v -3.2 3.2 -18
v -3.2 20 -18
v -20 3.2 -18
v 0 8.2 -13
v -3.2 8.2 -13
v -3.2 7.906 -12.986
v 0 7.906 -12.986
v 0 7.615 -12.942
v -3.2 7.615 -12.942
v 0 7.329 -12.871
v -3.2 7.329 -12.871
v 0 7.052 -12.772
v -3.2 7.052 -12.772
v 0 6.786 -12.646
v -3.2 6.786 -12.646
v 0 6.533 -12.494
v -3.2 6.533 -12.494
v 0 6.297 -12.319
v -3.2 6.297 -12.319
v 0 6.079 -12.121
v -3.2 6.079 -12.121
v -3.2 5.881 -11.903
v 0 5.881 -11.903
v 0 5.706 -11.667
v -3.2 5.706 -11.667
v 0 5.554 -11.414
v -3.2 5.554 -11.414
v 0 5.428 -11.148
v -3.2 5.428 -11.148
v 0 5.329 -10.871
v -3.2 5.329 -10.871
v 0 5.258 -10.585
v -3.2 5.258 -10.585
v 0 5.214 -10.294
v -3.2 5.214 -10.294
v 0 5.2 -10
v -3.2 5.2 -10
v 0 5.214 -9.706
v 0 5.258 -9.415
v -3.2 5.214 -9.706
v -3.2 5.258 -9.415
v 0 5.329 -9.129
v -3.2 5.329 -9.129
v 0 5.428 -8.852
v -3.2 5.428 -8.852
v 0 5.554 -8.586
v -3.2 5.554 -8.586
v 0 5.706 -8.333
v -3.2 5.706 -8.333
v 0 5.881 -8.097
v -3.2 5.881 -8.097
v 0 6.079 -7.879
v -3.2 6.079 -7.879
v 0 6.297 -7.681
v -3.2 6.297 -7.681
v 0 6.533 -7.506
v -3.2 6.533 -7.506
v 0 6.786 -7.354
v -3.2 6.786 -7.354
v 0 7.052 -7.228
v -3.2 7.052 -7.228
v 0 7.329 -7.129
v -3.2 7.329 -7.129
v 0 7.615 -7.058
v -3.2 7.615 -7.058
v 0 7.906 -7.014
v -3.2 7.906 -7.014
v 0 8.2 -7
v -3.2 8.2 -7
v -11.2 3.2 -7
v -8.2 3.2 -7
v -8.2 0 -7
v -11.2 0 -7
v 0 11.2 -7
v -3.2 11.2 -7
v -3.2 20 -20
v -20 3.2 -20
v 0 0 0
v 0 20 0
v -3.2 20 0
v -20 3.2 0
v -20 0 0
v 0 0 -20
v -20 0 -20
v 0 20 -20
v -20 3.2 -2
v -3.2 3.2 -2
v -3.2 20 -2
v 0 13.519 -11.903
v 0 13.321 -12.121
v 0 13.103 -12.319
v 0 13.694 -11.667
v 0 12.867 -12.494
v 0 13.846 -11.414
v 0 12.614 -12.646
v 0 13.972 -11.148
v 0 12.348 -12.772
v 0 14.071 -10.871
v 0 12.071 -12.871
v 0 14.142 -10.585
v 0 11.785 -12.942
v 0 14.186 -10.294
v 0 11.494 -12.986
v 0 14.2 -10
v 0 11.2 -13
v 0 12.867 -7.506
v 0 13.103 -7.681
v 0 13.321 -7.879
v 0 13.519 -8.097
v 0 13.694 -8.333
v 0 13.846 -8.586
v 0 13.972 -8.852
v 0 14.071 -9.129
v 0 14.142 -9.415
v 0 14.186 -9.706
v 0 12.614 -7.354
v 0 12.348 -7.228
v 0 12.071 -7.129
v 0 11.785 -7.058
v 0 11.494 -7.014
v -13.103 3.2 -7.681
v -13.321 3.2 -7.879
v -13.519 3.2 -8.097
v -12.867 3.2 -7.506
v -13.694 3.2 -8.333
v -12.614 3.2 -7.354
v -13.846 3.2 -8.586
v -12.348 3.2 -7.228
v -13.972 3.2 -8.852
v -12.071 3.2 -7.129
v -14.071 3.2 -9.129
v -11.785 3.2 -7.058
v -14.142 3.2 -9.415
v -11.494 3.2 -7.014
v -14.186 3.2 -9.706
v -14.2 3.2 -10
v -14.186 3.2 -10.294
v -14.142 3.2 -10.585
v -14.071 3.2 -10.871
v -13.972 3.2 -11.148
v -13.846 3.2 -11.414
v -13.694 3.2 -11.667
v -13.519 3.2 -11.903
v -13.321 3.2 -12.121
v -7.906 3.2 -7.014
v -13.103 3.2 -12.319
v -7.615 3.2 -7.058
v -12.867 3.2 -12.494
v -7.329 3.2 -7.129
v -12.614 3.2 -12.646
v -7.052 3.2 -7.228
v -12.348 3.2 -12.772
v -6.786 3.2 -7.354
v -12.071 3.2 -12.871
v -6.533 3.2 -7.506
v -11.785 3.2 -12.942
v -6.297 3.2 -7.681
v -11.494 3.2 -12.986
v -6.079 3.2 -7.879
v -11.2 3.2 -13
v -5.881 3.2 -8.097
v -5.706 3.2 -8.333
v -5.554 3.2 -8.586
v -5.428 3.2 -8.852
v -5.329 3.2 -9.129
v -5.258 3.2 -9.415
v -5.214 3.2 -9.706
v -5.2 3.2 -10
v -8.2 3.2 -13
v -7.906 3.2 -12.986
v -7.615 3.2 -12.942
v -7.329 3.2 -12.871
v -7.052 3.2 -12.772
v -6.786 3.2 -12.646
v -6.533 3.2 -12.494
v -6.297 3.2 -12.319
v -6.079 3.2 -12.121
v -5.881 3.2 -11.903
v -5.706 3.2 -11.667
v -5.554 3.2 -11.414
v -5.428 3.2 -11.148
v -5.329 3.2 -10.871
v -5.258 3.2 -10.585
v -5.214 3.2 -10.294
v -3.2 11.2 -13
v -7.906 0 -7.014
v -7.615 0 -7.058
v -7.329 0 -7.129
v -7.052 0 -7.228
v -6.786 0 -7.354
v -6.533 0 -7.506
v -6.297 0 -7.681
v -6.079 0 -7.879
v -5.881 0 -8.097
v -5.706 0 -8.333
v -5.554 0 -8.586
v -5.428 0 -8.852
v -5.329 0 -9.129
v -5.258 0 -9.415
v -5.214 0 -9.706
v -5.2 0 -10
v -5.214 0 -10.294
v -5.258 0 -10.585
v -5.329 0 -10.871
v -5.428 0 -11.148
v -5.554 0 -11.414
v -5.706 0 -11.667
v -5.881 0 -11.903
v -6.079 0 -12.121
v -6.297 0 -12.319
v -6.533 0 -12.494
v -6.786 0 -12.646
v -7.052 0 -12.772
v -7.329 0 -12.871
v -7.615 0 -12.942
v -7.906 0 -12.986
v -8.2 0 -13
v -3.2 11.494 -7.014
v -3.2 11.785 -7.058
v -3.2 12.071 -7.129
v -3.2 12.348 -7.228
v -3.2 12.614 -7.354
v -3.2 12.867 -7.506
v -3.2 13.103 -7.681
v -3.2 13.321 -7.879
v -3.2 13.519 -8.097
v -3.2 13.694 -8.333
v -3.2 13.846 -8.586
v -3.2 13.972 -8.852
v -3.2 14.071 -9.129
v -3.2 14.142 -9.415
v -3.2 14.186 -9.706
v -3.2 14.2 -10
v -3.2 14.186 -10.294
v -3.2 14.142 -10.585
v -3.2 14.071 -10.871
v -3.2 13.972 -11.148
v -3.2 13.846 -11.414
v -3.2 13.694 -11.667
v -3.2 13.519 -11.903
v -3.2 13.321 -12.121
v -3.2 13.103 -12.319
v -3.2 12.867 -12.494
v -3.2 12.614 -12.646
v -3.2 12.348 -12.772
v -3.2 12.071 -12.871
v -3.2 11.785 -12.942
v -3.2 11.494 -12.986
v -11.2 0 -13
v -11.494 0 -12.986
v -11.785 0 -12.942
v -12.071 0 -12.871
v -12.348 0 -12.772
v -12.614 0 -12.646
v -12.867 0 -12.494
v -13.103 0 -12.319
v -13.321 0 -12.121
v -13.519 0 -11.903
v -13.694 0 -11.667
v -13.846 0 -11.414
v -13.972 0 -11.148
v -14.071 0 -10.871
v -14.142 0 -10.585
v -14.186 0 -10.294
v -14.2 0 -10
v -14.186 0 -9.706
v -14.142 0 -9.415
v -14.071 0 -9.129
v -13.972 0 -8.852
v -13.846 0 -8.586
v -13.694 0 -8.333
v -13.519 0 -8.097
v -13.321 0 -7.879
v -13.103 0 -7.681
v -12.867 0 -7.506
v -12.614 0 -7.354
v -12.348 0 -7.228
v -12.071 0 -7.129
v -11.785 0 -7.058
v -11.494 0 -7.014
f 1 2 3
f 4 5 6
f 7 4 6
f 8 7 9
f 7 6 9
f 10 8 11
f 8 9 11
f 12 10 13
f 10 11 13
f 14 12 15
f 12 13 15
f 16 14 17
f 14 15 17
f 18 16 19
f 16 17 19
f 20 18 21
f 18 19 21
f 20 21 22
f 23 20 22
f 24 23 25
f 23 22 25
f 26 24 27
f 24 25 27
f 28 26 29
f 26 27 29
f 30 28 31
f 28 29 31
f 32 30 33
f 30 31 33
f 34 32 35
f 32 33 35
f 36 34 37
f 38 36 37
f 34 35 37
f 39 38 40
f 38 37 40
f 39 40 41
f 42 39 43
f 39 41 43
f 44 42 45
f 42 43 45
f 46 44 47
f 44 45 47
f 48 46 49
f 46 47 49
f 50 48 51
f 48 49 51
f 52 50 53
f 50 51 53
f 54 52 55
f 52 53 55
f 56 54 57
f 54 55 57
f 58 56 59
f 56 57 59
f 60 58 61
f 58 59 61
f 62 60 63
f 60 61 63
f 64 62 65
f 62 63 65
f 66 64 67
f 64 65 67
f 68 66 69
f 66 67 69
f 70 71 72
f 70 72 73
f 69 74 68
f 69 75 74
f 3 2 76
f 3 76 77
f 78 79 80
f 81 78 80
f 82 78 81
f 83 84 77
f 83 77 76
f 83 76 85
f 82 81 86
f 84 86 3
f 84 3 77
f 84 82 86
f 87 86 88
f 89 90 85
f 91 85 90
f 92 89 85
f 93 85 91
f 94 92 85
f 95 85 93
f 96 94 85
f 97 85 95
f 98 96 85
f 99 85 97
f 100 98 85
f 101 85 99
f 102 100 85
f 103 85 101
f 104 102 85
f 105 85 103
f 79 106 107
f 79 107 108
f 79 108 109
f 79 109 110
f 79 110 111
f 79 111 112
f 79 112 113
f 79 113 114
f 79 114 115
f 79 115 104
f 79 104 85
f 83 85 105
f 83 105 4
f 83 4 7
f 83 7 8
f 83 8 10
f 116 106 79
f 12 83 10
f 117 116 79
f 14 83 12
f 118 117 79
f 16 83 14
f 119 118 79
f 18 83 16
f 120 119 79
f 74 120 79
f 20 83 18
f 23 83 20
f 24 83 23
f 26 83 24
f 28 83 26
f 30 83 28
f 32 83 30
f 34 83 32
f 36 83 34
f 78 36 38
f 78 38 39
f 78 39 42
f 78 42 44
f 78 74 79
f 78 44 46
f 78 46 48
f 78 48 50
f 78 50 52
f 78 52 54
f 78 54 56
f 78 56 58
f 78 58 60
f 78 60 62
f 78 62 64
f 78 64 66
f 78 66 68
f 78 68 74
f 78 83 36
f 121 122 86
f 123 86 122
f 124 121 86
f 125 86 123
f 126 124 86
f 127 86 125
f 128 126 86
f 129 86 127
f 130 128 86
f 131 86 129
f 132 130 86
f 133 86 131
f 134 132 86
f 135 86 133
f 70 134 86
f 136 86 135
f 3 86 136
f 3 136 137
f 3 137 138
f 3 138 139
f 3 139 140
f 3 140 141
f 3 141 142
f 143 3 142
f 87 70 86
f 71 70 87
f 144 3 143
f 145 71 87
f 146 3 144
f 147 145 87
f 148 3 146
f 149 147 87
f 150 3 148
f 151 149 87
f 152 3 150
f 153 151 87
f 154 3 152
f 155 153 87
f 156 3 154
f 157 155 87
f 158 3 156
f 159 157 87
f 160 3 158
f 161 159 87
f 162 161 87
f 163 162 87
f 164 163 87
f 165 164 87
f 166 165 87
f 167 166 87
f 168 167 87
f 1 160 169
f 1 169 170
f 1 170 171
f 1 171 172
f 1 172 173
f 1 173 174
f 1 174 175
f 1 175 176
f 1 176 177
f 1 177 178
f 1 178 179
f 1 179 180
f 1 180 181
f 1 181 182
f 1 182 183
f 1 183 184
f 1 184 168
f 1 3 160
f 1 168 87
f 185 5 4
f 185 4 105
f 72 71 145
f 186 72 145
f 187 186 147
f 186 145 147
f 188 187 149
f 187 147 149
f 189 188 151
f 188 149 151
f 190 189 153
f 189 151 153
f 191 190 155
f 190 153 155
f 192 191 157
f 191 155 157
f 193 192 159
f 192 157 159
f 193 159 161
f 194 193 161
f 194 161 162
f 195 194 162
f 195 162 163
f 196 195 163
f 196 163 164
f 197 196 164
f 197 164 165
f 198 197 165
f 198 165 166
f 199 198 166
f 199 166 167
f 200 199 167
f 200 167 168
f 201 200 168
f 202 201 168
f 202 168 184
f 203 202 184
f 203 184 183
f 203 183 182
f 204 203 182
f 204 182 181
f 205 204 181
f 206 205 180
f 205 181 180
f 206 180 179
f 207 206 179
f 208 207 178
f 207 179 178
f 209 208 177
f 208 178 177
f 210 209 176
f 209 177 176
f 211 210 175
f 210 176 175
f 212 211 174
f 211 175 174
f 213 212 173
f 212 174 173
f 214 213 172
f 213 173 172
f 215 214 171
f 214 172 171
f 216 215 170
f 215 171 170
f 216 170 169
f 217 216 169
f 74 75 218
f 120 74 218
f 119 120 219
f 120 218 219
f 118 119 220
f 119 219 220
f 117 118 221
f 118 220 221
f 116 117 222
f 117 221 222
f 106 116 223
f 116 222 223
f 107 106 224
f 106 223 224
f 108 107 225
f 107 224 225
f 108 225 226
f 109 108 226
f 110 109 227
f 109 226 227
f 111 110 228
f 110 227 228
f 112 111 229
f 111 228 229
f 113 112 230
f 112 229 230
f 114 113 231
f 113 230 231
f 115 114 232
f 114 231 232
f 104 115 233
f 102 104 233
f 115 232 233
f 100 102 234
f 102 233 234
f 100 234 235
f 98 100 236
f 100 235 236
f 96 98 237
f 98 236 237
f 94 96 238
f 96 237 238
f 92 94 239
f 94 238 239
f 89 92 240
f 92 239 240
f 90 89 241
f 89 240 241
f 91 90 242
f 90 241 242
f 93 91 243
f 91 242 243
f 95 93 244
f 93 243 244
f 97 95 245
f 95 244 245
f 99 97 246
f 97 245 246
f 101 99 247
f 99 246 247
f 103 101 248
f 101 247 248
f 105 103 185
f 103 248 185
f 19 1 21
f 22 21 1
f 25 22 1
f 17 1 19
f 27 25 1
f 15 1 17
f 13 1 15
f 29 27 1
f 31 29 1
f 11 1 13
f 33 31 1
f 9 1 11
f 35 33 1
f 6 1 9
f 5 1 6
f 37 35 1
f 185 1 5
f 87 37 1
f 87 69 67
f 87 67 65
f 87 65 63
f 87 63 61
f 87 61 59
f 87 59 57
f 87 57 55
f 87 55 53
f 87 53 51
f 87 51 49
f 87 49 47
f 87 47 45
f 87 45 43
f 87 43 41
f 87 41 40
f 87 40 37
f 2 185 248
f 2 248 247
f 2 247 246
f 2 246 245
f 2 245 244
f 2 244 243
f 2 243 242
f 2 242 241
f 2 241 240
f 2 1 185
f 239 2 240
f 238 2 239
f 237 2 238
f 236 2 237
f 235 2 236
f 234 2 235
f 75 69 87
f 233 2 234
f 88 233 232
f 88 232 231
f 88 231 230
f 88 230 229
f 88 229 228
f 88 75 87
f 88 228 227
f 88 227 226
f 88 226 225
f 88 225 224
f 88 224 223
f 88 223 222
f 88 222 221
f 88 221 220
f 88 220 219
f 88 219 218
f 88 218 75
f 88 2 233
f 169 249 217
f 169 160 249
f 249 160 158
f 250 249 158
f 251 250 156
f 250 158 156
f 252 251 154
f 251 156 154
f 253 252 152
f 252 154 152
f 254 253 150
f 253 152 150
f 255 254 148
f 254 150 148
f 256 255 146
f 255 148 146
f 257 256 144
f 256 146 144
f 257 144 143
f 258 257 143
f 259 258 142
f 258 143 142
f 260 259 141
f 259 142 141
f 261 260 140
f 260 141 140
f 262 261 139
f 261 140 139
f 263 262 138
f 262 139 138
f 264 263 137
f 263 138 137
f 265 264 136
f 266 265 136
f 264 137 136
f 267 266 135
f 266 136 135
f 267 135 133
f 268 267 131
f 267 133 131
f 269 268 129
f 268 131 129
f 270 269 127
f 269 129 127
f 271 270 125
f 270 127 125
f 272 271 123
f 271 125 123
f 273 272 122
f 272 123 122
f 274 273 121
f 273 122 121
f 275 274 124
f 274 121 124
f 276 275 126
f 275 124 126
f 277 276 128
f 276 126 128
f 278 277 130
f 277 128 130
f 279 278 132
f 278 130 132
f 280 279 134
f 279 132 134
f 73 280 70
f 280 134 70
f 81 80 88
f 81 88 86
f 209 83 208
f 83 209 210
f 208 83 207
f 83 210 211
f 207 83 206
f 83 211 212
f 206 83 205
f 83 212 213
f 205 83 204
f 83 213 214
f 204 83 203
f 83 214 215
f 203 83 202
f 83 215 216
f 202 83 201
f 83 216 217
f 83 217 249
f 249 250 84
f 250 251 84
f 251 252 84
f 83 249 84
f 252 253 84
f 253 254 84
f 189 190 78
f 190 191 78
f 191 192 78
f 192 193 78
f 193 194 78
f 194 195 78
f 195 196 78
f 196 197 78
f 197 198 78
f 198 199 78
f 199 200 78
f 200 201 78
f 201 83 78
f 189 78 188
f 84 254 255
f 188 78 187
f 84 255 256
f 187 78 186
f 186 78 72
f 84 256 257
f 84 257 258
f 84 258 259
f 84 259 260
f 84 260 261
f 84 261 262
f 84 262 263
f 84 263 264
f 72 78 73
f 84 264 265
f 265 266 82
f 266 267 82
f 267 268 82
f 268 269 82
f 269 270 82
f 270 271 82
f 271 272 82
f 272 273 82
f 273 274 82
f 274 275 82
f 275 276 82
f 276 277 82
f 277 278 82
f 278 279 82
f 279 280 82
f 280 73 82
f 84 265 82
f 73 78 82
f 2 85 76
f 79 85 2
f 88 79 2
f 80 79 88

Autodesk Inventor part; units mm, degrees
ref_plane "YZ Plane" through (0, 0, 0) normal (1, 0, 0) x (0, 1, 0)
ref_plane "XZ Plane" through (0, 0, 0) normal (0, 1, 0) x (-1, 0, 0)
ref_plane "XY Plane" through (0, 0, 0) normal (0, 0, 1) x (1, 0, 0)
sketch "Sketch1" plane through (0, 0, 0) normal (0, 1, 0) x (-1, 0, 0)
  line L0 (0, 0) -> (20, 0)
  line L1 (20, 0) -> (20, -20)
  line L2 (20, -20) -> (0, -20)
  line L3 (0, -20) -> (0, 0)
  dimension "d0" = 20
  dimension "d1" = 20
extrude "Extrusion1" add sketch "Sketch1" along normal blind 20
sketch "Sketch2" plane through (-20, 0, 0) normal (0, 0, 1) x (1, 0, 0)
  line L0 (20, 0) -> (0, 0) projected
  line L1 (20, 0) -> (20, 20) projected
  line L2 (20, 20) -> (0, 20) projected
  line L3 (0, 20) -> (16.8, 20)
  line L4 (0, 0) -> (0, 20) projected
  line L5 (1.6773, 3.2839) -> (0, 3.1156)
  line L6 (0, 20) -> (0, 3.2)
  line L7 (16.8, 20) -> (0, 3.2)
  dimension "d6" = 16.8
  dimension "d9" = 16.8
extrude "Extrusion3" cut sketch "Sketch2" against normal blind 20 contours L7 L4 L2
sketch "Sketch3" plane through (0, 20, 0) normal (0, 1, 0) x (1, 0, 0)
  line L0 (0, 18) -> (-20, 18)
  line L1 (-20, 18) -> (-20, 2)
  line L2 (-20, 2) -> (0, 2)
  line L3 (0, 2) -> (0, 18)
  line L4 (-20, 20) -> (-3.2, 20) projected
  line L5 (-4, 18) -> (12, 18) construction
  line L6 (0, 18) -> (0, 2)
  line L7 (-3.2, 18) -> (-3.2, 2)
  point P0 (-20, 10)
  dimension "d12" = 16
  dimension "d13" = 2
extrude "Extrusion4" cut sketch "Sketch3" against normal blind 16.8 contours L7 L2 L1 L0
sketch "Sketch4" plane through (0, 3.2, 0) normal (0, 1, 0) x (1, 0, 0)
  line L0 (-14.2, 13) -> (-5.2, 13)
  line L1 (-5.2, 13) -> (-5.2, 7)
  line L2 (-5.2, 7) -> (-14.2, 7)
  line L3 (-14.2, 7) -> (-14.2, 13)
  line L4 (-3.2, 18) -> (-3.2, 2) projected
  arc A0 (-8.2, 7) -> (-8.2, 13) centre (-8.2, 10) ccw
  line L5 (-18, 13.026) -> (-18, 7.026)
  line L6 (-20, 2) -> (-20, 18) projected
  ellipse E0 centre (-14.2, 10) end of major axis (-18, 10) minor radius 3 (-14.2, 13) -> (-14.2, 7) ccw
  arc A1 (-11.2, 13) -> (-11.2, 7) centre (-11.2, 10) ccw
  line L7 (-5.2, 10) -> (-18, 10)
  line L8 (-20, 18) -> (-3.2, 18) projected
  point P0 (0, 0)
  dimension "d18" = 6
  dimension "d19" = 9
  dimension "d20" = 2
  dimension "d21" = 6
  dimension "d22" = 2
  dimension "d40" = 8
extrude "Extrusion5" cut sketch "Sketch4" against normal blind 16.8 contours L0 A0 L7 A1 | L7 A0 L2 A1
sketch "Sketch8" plane through (-3.2, 0.3648, -21.4635) normal (-1, 0, 0) x (0, -1, 0)
  line L0 (-13.8352, 14.4635) -> (-4.8352, 14.4635)
  line L1 (-4.8352, 14.4635) -> (-4.8352, 8.4635)
  line L2 (-4.8352, 8.4635) -> (-13.8352, 8.4635)
  line L3 (-13.8352, 8.4635) -> (-13.8352, 14.4635)
  line L4 (-2.8352, 18) -> (-2.8352, 2)
  arc A0 (-7.8352, 8.4635) -> (-7.8352, 14.4635) centre (-7.8352, 11.4635) ccw
  line L5 (-18, 13.026) -> (-18, 7.026)
  line L6 (-20, 2) -> (-20, 18)
  ellipse E0 centre (-13.8352, 11.4635) end of major axis (-18, 11.4635) minor radius 3 (-13.8352, 14.4635) -> (-13.8352, 8.4635) ccw
  arc A1 (-10.8352, 14.4635) -> (-10.8352, 8.4635) centre (-10.8352, 11.4635) ccw
  line L7 (-4.8352, 11.4635) -> (-18, 11.4635)
  line L8 (-2.8352, 19.4635) -> (-2.8352, 3.4635) projected
  line L9 (-19.6352, 19.4635) -> (-2.8352, 19.4635) projected
  point P0 (0, 0)
  dimension "d34" = 6
  dimension "d33" = 9
  dimension "d32" = 2
  dimension "d31" = 6
  dimension "d30" = 2
  dimension "d38" = 0
  dimension "d39" = 5
extrude "Extrusion7" cut sketch "Sketch8" against normal blind 16.8 contours L0 A0 L7 A1 | L7 A0 L2 A1
properties part number "Al_Bracket"
